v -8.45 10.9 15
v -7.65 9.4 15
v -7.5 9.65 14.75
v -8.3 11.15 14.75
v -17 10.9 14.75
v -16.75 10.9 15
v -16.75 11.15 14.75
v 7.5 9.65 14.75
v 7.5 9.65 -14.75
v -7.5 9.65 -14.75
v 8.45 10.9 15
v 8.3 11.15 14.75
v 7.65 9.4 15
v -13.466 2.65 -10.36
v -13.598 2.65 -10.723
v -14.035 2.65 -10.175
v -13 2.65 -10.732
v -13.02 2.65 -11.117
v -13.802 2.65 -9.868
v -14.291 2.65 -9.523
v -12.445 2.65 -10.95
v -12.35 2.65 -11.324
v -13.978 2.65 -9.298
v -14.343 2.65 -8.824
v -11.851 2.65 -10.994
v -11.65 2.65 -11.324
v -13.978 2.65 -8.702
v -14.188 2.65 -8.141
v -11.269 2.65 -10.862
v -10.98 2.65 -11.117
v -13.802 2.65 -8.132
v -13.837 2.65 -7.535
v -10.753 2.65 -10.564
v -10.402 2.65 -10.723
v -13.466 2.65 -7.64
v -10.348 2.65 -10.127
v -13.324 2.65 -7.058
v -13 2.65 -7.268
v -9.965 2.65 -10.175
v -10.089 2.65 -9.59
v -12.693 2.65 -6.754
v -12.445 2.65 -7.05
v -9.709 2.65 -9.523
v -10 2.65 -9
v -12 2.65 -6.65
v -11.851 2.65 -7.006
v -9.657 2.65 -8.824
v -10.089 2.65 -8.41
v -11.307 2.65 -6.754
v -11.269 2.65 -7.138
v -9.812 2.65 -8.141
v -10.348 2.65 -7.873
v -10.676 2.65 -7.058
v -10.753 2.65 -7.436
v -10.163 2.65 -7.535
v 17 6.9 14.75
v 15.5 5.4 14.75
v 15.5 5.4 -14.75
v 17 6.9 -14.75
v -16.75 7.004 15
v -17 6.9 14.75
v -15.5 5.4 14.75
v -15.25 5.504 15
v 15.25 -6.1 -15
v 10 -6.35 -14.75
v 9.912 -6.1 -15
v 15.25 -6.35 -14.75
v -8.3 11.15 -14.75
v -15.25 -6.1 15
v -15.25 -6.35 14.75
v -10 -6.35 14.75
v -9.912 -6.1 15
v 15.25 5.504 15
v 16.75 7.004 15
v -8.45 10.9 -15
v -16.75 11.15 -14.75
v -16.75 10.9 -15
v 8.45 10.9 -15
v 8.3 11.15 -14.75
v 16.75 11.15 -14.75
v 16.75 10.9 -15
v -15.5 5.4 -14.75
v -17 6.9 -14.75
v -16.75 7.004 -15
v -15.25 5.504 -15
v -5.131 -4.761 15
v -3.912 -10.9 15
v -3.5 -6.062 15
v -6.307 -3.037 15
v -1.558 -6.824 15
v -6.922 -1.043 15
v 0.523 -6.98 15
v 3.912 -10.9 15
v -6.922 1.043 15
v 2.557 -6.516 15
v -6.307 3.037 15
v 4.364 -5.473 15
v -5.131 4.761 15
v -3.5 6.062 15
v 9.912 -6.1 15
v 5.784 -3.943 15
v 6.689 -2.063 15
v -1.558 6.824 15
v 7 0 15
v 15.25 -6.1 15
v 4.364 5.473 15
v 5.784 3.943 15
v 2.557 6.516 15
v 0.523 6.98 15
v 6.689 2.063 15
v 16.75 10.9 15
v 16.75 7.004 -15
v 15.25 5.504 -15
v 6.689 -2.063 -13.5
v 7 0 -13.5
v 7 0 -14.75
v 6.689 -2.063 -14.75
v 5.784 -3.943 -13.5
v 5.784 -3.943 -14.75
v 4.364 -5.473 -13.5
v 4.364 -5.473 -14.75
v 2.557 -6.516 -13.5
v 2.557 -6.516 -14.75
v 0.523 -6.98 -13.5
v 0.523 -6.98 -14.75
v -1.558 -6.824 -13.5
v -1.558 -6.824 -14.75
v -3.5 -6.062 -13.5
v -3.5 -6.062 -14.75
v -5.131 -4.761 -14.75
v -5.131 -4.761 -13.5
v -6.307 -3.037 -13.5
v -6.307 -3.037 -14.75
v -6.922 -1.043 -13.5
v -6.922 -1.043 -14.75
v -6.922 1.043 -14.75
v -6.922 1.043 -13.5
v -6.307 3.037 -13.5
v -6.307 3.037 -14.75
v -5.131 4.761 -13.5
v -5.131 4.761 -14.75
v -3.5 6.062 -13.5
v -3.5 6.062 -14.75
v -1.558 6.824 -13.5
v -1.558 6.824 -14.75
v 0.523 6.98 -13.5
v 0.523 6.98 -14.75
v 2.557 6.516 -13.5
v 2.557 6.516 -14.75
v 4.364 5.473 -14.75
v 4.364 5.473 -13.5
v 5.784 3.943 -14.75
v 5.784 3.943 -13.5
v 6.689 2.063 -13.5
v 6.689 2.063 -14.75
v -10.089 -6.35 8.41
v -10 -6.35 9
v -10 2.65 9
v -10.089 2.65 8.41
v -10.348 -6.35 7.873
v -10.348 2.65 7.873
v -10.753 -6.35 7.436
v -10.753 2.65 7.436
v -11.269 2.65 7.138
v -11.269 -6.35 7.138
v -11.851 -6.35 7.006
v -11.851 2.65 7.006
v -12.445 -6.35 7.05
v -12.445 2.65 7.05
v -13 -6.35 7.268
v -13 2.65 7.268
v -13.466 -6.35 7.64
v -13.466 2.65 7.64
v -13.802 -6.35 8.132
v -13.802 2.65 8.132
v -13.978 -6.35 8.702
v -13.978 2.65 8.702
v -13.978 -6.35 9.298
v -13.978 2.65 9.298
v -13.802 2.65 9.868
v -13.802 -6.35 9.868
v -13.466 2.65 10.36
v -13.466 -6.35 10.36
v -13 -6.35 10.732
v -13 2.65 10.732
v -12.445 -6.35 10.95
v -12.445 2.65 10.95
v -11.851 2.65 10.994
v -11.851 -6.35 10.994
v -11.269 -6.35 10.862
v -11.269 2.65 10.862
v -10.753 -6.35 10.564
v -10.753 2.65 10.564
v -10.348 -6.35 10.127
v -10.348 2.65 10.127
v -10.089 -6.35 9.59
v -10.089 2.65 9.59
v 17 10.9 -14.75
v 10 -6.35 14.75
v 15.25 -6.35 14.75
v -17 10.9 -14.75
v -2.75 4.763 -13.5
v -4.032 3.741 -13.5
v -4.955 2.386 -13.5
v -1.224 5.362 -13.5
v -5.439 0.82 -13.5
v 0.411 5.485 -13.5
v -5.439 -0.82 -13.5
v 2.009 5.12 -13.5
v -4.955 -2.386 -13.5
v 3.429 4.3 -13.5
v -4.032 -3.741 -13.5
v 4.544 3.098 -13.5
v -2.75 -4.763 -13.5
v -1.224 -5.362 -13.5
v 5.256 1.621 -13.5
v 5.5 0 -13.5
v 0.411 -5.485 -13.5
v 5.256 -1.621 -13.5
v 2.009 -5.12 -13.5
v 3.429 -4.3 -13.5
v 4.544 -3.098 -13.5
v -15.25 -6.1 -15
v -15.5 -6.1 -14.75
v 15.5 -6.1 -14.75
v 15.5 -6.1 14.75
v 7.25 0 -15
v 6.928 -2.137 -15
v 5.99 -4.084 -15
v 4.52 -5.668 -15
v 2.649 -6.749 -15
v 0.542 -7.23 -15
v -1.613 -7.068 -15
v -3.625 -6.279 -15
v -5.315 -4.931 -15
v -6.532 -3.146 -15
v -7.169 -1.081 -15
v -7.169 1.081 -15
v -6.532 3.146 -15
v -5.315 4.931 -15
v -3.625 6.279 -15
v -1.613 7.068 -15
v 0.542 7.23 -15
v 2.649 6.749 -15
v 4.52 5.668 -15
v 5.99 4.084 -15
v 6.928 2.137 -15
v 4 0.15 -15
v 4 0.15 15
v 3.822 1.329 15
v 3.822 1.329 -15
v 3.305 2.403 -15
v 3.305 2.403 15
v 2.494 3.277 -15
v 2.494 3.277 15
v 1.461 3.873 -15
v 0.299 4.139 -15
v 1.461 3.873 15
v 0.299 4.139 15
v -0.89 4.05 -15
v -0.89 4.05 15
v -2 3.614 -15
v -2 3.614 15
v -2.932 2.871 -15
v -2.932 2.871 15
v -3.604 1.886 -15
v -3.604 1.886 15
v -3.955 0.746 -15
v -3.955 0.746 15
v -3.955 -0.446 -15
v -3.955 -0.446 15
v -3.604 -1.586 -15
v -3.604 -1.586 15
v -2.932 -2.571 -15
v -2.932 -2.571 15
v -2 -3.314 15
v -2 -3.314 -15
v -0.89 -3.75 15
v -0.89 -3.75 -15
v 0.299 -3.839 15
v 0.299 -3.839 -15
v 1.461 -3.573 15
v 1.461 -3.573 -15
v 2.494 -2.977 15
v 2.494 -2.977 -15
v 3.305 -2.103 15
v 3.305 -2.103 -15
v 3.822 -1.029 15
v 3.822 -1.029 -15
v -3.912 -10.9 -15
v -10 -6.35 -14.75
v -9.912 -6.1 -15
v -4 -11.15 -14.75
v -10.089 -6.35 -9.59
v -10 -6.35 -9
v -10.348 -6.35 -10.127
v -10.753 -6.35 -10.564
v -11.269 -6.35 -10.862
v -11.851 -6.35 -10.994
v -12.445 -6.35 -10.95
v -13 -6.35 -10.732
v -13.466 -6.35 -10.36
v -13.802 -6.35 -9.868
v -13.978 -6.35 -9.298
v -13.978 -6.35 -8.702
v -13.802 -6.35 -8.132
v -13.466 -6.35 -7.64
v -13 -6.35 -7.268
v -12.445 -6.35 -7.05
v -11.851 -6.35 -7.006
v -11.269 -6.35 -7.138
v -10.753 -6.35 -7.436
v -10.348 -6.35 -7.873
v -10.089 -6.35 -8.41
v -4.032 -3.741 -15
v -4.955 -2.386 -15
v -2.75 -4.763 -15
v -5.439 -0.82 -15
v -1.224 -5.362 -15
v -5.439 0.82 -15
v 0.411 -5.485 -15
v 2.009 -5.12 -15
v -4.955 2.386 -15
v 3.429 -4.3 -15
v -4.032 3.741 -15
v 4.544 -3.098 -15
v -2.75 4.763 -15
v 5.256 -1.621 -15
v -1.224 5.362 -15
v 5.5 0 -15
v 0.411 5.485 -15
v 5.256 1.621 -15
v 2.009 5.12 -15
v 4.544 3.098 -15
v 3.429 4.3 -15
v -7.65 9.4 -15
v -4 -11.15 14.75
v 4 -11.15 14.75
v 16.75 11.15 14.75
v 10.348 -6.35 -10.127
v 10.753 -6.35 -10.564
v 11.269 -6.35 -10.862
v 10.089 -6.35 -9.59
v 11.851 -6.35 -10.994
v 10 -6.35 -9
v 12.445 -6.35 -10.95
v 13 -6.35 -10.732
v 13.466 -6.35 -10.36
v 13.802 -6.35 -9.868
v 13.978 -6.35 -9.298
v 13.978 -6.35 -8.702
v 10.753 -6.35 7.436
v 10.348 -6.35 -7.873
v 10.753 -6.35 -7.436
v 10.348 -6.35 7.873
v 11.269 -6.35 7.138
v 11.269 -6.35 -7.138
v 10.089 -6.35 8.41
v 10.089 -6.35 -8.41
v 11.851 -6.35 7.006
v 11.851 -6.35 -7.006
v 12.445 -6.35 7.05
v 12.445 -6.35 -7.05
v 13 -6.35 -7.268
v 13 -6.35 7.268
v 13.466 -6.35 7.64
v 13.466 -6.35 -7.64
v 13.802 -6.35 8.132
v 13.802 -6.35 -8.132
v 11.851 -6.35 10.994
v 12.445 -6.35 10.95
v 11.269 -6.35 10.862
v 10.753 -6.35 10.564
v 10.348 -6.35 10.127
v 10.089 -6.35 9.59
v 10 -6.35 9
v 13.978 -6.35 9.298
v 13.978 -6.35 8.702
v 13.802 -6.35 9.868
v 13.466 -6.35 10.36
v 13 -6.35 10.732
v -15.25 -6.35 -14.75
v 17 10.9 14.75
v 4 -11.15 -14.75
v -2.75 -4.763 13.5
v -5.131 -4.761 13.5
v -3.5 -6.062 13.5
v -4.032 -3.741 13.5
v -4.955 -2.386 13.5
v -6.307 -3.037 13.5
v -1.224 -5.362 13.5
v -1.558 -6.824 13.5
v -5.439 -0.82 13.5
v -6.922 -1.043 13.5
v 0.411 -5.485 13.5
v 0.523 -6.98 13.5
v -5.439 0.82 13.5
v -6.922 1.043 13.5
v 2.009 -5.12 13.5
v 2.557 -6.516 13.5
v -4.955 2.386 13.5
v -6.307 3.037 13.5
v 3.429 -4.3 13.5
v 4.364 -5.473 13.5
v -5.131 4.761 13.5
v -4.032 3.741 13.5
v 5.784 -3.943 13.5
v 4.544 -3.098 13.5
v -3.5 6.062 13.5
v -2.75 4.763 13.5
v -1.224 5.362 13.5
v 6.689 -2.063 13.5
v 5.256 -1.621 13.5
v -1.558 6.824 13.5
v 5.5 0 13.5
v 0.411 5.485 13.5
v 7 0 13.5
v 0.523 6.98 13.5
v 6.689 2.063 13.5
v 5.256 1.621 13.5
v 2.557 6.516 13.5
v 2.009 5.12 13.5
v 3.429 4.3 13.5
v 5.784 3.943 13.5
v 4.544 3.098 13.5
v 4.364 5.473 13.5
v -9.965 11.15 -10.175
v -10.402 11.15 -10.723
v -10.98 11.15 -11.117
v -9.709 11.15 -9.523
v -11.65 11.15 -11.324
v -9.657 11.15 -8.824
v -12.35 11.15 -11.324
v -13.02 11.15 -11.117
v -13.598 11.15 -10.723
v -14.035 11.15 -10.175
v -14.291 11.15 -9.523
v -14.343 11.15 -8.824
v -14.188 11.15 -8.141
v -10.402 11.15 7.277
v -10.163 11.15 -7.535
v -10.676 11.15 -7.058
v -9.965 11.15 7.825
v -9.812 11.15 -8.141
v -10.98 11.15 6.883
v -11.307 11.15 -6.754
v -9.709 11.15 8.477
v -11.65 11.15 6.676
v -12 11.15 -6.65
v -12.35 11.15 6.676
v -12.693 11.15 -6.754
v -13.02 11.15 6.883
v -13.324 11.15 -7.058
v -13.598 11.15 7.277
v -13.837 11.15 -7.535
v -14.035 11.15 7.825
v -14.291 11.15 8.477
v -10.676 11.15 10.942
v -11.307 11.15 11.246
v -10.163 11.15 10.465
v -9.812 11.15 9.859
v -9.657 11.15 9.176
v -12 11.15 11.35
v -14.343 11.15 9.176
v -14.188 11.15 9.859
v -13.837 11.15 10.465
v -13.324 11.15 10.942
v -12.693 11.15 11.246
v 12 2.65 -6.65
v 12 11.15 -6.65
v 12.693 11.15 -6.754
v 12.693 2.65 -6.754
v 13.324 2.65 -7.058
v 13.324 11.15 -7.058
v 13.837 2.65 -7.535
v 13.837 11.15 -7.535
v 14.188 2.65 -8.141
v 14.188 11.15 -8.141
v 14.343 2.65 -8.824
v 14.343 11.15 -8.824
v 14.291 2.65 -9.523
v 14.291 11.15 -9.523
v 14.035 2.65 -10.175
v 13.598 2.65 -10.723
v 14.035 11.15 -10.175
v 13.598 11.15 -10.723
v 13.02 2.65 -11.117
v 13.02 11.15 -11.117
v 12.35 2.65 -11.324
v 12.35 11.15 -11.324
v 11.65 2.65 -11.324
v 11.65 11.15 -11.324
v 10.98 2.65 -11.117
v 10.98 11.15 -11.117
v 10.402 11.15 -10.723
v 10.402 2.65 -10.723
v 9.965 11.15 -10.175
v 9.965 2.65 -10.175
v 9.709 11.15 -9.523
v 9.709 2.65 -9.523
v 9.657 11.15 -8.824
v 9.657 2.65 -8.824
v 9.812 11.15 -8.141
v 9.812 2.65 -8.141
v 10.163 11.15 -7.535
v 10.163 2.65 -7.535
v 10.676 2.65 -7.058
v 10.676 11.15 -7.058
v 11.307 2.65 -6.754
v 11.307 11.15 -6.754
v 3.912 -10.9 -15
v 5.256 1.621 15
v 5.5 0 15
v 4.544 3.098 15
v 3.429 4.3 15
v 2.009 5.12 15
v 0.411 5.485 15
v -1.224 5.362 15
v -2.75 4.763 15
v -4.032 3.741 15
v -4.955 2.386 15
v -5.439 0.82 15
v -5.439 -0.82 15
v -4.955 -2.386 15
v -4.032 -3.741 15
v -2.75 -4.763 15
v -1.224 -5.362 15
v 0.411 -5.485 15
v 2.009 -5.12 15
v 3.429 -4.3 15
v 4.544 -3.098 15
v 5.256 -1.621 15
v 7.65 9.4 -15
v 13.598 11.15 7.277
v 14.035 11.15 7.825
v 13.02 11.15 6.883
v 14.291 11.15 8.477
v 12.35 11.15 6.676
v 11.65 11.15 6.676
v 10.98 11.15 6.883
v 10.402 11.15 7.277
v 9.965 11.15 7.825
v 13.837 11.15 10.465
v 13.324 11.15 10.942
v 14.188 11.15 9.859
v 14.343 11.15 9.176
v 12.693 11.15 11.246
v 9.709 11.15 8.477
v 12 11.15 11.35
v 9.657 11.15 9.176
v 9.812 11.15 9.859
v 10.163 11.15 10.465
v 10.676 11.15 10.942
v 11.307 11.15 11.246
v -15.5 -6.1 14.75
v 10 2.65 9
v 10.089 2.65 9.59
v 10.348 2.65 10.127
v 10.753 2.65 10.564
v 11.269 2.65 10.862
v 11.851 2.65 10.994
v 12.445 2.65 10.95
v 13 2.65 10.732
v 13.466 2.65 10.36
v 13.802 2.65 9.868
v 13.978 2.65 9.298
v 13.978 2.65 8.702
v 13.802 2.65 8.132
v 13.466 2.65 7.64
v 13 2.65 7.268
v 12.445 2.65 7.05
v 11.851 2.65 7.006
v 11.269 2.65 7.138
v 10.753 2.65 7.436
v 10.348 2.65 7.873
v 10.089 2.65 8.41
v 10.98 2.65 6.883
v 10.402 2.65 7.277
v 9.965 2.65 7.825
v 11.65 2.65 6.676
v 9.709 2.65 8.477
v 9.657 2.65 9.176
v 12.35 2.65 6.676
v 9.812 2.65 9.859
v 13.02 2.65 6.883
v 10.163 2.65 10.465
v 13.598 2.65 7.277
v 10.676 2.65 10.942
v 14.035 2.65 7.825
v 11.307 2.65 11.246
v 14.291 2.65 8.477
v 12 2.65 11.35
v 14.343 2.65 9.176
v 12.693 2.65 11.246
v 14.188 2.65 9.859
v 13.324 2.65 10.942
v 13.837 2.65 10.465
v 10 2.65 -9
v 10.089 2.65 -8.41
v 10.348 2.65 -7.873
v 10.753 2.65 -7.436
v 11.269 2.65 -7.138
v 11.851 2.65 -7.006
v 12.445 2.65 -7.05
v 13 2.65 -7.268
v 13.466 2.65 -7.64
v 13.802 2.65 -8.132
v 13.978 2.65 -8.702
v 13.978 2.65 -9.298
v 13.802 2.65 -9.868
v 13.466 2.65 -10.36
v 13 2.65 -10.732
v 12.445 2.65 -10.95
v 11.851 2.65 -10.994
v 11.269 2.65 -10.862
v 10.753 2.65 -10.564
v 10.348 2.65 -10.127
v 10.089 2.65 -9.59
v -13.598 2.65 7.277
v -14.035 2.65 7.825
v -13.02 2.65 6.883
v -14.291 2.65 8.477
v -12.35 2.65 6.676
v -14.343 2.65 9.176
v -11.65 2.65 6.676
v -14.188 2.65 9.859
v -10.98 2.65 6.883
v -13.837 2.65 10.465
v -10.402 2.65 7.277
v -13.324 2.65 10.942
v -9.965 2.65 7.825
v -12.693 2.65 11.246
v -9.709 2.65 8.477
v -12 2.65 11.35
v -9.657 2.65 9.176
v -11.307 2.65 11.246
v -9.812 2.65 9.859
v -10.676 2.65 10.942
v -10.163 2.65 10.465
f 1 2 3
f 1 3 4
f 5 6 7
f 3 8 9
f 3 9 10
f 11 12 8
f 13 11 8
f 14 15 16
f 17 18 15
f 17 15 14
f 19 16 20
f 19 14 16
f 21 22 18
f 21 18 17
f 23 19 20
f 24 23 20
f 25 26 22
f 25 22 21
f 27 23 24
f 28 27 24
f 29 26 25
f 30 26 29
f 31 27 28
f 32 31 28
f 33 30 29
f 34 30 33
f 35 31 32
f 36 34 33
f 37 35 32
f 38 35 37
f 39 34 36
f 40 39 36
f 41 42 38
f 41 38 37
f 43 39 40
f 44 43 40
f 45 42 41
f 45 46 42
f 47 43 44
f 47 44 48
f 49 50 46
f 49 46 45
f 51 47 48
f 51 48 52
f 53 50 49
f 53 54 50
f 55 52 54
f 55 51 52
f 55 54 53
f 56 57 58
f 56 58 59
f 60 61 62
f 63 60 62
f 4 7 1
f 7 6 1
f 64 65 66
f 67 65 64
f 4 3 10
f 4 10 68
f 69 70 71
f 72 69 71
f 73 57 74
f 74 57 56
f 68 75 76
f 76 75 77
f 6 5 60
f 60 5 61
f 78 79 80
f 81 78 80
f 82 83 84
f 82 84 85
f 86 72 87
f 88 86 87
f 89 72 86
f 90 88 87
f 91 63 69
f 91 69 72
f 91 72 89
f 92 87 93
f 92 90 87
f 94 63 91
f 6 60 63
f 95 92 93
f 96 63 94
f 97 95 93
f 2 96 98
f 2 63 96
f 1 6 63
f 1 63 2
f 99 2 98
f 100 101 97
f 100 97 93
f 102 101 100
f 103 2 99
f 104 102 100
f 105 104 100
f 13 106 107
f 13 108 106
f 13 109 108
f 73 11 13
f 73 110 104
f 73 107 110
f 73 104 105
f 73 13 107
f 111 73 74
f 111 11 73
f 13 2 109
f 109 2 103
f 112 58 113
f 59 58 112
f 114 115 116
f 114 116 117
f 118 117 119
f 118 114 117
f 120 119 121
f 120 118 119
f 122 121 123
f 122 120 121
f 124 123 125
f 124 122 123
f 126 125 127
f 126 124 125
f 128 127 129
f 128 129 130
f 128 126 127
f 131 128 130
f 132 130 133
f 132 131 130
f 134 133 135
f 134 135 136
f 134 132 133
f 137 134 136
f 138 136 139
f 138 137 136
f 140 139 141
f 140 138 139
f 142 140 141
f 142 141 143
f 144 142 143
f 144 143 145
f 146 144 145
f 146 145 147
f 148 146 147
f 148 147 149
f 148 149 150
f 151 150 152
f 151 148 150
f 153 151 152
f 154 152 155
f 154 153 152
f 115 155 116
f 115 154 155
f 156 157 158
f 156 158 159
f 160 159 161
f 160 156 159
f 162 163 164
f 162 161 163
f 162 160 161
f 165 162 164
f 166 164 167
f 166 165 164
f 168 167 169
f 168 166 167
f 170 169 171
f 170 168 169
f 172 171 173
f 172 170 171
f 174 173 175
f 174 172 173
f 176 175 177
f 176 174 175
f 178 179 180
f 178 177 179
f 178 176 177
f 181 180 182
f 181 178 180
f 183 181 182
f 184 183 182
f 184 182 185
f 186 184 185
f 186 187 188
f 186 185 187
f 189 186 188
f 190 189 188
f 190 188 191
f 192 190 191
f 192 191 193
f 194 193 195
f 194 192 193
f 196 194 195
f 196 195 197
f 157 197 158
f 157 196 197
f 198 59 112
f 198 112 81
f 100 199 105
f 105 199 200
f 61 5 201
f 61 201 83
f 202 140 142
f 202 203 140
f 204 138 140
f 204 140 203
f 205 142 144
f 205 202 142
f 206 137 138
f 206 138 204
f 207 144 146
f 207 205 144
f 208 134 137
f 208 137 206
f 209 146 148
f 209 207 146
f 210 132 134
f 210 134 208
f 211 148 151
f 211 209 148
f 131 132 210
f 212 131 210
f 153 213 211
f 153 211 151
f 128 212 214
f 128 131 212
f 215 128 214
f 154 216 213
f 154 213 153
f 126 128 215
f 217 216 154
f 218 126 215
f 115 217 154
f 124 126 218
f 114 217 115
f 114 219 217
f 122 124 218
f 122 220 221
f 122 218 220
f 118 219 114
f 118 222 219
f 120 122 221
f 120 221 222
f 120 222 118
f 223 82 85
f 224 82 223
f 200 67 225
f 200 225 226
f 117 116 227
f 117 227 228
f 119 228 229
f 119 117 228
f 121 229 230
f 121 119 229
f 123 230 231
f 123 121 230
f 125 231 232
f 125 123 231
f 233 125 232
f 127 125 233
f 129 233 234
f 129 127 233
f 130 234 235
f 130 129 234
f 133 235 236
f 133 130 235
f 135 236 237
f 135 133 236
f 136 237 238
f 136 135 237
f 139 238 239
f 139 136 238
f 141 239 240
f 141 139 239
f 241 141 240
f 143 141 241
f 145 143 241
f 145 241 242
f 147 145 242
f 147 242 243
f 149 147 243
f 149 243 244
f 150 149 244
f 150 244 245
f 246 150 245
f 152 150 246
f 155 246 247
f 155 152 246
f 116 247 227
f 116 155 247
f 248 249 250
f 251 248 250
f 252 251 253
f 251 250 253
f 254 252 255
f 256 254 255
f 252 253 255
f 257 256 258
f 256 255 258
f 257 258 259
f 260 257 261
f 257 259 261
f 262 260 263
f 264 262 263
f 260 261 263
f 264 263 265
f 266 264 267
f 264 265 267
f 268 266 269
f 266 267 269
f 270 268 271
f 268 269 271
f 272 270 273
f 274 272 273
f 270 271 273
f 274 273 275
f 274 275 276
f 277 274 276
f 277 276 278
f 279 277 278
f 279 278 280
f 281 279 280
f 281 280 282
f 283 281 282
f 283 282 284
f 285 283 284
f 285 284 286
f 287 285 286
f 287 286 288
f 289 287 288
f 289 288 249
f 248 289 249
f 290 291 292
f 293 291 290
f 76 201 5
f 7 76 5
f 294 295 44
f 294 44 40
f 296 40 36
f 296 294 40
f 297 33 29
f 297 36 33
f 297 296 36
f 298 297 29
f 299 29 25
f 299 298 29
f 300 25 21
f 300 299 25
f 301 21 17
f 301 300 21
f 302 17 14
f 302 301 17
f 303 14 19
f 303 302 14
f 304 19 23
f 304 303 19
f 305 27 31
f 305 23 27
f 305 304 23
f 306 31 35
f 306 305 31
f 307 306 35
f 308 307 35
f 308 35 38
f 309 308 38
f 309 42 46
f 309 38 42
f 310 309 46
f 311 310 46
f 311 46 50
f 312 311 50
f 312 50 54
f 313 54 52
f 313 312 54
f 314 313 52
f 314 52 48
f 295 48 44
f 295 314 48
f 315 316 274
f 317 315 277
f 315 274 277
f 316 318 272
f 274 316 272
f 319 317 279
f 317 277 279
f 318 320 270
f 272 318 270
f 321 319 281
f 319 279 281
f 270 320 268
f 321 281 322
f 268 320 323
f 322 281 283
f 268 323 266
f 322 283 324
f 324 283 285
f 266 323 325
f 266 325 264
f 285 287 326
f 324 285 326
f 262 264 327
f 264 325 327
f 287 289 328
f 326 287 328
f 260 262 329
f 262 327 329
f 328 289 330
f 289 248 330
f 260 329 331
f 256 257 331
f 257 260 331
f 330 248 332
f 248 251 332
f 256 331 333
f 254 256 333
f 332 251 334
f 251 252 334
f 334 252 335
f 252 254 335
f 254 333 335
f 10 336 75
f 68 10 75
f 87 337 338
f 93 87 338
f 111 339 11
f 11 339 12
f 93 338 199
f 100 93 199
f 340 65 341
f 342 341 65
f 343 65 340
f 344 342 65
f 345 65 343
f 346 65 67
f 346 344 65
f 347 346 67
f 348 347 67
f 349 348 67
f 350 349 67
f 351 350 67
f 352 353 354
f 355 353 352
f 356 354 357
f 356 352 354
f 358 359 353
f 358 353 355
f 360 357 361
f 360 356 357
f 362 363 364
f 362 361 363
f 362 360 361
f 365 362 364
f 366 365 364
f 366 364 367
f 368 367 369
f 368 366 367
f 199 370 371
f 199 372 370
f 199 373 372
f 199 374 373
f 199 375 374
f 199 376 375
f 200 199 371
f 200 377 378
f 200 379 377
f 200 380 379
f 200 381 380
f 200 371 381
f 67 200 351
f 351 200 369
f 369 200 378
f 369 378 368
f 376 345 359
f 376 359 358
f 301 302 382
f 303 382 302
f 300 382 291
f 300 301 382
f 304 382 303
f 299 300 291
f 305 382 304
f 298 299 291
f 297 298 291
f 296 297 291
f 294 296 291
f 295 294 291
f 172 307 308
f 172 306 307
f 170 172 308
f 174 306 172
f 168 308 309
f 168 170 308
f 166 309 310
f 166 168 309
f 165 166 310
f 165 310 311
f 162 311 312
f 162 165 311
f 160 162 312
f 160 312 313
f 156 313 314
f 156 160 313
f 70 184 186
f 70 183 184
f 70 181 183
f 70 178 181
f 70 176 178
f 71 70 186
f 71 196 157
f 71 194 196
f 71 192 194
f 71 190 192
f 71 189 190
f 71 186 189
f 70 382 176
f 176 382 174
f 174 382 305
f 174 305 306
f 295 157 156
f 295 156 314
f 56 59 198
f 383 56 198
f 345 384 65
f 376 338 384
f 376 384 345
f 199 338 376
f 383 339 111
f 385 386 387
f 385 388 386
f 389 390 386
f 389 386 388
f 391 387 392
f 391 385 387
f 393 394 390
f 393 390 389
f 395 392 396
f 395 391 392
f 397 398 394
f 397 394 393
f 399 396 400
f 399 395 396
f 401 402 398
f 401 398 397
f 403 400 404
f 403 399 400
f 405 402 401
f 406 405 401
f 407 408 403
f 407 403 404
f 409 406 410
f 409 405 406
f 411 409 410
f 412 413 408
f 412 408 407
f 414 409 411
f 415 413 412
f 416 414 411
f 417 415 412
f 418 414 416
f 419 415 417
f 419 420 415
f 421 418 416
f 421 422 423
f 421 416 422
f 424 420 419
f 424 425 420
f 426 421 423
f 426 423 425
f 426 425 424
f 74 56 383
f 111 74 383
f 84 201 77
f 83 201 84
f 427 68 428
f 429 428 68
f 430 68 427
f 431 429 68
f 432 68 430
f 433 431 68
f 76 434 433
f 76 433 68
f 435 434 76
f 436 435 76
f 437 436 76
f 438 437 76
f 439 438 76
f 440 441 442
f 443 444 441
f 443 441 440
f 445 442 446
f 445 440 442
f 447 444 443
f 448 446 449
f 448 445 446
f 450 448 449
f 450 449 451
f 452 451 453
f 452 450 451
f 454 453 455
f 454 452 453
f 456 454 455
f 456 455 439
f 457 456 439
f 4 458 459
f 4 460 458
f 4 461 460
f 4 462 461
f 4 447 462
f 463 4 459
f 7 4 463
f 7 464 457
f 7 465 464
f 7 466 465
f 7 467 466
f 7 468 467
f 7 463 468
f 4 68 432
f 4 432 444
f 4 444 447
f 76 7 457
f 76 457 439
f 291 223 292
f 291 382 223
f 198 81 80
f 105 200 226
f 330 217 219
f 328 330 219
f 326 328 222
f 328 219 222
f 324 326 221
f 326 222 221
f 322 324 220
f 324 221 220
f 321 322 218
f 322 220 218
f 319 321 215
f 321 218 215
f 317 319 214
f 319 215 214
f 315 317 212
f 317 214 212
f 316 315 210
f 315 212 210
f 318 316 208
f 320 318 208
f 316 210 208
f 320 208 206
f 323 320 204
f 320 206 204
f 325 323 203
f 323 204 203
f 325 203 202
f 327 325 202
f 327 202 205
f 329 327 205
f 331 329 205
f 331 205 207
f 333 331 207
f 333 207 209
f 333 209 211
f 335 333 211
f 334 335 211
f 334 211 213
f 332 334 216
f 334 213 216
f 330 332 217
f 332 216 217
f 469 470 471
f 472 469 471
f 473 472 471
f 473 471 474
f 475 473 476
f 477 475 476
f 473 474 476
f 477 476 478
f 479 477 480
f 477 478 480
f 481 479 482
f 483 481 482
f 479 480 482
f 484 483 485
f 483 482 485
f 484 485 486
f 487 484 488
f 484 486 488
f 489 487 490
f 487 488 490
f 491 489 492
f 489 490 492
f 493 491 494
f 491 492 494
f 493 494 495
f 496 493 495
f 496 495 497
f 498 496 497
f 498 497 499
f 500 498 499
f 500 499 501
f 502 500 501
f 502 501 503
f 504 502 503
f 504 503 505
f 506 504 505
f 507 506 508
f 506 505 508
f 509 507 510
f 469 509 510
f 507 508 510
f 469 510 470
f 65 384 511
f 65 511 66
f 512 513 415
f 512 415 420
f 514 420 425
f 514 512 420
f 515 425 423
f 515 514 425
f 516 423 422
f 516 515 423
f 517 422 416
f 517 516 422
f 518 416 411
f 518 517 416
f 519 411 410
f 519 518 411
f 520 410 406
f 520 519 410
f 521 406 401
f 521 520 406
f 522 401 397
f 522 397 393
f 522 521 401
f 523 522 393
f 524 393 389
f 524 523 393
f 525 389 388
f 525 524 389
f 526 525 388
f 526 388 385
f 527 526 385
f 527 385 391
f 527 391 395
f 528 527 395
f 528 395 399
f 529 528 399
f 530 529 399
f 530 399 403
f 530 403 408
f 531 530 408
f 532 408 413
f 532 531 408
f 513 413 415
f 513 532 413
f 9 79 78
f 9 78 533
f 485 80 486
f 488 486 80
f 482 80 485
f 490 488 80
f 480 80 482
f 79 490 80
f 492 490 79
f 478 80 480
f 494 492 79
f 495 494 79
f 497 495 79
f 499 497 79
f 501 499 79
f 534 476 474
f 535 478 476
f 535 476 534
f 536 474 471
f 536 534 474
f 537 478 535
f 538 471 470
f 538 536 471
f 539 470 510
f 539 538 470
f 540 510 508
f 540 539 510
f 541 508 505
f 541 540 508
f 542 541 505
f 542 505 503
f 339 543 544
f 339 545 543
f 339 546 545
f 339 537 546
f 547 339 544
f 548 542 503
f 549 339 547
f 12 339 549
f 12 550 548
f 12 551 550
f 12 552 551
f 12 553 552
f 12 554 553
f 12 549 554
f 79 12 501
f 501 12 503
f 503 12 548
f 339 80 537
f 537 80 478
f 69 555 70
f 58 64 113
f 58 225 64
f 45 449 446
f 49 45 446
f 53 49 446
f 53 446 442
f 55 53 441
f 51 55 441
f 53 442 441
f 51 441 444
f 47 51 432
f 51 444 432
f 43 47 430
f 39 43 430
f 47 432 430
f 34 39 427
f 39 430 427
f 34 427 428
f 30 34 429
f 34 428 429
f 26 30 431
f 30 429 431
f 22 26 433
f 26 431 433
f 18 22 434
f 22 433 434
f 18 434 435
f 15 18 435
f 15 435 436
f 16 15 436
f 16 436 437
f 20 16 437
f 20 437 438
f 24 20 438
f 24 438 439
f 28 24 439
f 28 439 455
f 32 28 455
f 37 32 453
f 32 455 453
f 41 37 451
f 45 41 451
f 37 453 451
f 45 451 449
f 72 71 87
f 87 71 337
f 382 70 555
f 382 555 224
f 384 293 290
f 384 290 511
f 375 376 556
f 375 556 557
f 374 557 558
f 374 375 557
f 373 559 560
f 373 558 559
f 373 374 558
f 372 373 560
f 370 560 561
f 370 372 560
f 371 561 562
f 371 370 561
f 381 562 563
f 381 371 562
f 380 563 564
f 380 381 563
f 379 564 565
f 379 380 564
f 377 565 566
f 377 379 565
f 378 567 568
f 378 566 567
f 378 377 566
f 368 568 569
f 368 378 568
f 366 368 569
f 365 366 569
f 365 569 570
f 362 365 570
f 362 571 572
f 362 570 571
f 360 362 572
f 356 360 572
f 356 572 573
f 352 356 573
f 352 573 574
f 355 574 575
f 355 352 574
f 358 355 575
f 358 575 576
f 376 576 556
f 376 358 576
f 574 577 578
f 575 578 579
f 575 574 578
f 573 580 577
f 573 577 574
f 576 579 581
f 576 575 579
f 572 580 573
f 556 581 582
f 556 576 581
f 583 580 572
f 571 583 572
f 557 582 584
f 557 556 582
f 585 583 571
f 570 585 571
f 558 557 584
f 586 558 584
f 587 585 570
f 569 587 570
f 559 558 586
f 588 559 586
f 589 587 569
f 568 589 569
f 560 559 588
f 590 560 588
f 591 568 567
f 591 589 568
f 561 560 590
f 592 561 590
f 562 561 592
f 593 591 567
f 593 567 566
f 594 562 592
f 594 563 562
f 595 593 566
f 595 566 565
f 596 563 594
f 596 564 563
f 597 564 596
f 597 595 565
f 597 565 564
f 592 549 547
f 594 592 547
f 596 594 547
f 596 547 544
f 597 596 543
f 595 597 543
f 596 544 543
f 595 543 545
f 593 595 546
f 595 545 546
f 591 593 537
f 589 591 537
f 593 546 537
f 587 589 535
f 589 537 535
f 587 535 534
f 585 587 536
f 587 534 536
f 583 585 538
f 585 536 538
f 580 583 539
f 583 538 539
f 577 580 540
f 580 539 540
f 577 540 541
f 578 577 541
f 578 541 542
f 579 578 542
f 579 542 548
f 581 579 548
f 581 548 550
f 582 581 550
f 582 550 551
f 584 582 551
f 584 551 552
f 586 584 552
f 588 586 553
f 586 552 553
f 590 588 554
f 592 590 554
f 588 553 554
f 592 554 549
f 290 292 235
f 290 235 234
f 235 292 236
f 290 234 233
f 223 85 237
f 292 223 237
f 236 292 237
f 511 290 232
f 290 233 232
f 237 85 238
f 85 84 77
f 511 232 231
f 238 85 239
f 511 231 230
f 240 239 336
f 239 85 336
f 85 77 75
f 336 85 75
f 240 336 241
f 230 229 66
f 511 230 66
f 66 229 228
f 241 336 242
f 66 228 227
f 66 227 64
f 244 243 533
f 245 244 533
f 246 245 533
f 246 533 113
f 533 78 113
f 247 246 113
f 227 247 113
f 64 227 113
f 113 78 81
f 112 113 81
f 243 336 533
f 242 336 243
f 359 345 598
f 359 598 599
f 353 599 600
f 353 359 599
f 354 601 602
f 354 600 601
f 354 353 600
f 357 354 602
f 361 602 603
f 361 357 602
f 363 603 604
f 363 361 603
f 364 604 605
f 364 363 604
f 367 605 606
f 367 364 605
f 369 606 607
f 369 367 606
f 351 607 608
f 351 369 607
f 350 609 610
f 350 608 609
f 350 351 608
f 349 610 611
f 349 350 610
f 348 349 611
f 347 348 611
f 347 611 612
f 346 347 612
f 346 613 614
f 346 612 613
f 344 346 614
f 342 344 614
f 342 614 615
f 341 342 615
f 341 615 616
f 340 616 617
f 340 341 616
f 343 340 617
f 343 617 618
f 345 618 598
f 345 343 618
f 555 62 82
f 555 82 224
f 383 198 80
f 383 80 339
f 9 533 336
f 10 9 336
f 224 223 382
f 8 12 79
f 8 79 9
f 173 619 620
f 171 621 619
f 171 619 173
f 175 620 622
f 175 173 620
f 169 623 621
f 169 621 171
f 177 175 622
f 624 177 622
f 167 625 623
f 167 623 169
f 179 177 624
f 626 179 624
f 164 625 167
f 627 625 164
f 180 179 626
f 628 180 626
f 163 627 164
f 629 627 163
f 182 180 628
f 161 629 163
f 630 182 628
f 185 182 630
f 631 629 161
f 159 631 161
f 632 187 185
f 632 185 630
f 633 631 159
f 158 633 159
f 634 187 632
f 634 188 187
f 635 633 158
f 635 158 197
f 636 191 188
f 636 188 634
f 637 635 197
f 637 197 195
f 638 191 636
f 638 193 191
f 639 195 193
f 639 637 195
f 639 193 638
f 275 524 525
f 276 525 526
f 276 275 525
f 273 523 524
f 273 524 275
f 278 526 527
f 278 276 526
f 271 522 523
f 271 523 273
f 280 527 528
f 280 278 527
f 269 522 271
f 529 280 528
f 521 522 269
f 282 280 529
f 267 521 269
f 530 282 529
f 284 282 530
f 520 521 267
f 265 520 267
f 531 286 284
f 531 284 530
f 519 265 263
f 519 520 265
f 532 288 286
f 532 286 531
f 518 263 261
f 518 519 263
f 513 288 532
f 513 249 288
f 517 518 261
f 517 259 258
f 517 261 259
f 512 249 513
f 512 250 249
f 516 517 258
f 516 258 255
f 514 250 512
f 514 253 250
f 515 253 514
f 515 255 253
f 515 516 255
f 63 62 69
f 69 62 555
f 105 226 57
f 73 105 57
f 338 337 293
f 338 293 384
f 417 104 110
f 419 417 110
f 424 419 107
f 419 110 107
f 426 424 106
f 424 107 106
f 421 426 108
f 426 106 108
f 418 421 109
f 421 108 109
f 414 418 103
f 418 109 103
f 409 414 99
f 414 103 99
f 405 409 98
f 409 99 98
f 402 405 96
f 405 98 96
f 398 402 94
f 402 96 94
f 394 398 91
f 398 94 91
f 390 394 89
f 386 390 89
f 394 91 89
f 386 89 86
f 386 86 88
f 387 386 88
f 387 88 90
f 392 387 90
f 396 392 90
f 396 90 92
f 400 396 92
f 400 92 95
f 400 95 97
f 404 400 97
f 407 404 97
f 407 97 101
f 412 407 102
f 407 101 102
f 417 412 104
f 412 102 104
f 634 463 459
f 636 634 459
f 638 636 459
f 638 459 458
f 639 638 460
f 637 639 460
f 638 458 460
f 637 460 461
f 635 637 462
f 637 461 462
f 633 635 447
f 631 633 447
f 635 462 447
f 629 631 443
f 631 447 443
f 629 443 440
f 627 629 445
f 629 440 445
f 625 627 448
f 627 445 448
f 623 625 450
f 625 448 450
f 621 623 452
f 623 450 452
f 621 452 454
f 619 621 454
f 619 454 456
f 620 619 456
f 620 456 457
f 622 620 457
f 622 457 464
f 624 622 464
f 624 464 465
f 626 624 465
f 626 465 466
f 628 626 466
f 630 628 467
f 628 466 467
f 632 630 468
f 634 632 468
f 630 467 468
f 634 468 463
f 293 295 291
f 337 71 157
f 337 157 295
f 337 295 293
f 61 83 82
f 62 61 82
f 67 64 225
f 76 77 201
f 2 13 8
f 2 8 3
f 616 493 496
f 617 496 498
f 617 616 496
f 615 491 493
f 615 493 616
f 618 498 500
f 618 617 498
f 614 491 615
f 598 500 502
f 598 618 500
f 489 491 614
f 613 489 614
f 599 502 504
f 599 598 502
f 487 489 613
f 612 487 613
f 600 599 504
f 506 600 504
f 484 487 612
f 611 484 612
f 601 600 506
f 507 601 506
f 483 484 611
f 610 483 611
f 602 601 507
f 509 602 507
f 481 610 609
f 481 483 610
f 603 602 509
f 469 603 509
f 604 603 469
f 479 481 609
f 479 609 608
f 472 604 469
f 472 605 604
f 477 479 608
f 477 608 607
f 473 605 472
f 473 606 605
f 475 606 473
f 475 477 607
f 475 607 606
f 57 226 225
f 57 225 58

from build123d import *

# Parameters (mm, degrees)
SALIENTE_EXTRUIR1_DEPTH    = 15
CROQUIS2_R                 = 4
CORTAR_EXTRUIR1_DEPTH      = 37.239791666
CORTAR_EXTRUIR2_DEPTH      = 32.800786154
CORTAR_EXTRUIR2_DEPTH_BACK = 32.800786154
CROQUIS3_R                 = 2
SALIENTE_EXTRUIR2_DEPTH    = 30
CROQUIS5_R                 = 7
CROQUIS5_R_2               = 5.5
CORTAR_EXTRUIR3_DEPTH      = 1.5
CORTAR_EXTRUIR4_START      = -1.5
CROQUIS6_R                 = 7
CROQUIS6_R_2               = 5.5
CORTAR_EXTRUIR4_DEPTH      = 1.5
CROQUIS7_R                 = 2.35
CORTAR_EXTRUIR5_DEPTH      = 8.5
CHAFL_N1_SIZE              = 0.25


with BuildPart() as part:
    # Croquis1 → Saliente-Extruir1 (new, symmetric)
    with BuildSketch(Plane.XY):
        Polygon((-4, -11.15), (4, -11.15), (10, -6.35), (15.5, -6.35), (15.5, 5.4), (17, 6.9), (17, 11.15), (10, 11.15), (7.5, 9.65), (-7.5, 9.65), (-10, 11.15), (-17, 11.15), (-17, 6.9), (-15.5, 5.4), (-15.5, -6.35), (-10, -6.35), align=None)
    extrude(amount=SALIENTE_EXTRUIR1_DEPTH, both=True)

    # Croquis2 → Cortar-Extruir1 (cut, through all)
    with BuildSketch(Plane.XY.offset(15)):
        with Locations((0, 0.15)):
            Circle(CROQUIS2_R)
    extrude(amount=-CORTAR_EXTRUIR1_DEPTH, mode=Mode.SUBTRACT)

    # Croquis3 → Cortar-Extruir2 (cut, two sides: drawn at the far end of the back side and taken through both)
    with BuildSketch(Plane(origin=(0, 11.15, 0), x_dir=(1, 0, 0), z_dir=(0, 1, 0)).offset(-CORTAR_EXTRUIR2_DEPTH_BACK)):
        with Locations((-12, 9)):
            Circle(CROQUIS3_R)
        with Locations(Location((12, 9, 0), (0, 0, 180))):
            Circle(CROQUIS3_R)
        with Locations((-12, -9)):
            Circle(CROQUIS3_R)
        with Locations(Location((12, -9, 0), (0, 0, 180))):
            Circle(CROQUIS3_R)
    extrude(amount=CORTAR_EXTRUIR2_DEPTH + CORTAR_EXTRUIR2_DEPTH_BACK, mode=Mode.SUBTRACT)

    # Croquis4 → Saliente-Extruir2 (add, through all)
    with BuildSketch(Plane.XY.offset(15)):
        Polygon((-10, 11.15), (-7.5, 9.65), (-8.3, 11.15), align=None)
        Polygon((7.5, 9.65), (10, 11.15), (8.3, 11.15), align=None)
    extrude(amount=-SALIENTE_EXTRUIR2_DEPTH)

    # Croquis5 → Cortar-Extruir3 (cut)
    with BuildSketch(Plane.XY.offset(15)):
        Circle(CROQUIS5_R)
        Circle(CROQUIS5_R_2, mode=Mode.SUBTRACT)
    extrude(amount=-CORTAR_EXTRUIR3_DEPTH, mode=Mode.SUBTRACT)

    # Croquis6 → Cortar-Extruir4 (cut)
    with BuildSketch(Plane(origin=(0, 0, -15), x_dir=(-1, 0, 0), z_dir=(0, 0, -1)).offset(CORTAR_EXTRUIR4_START)):
        with Locations(Location((0, 0, 0), (0, 0, 180))):
            Circle(CROQUIS6_R)
        with Locations(Location((0, 0, 0), (0, 0, 180))):
            Circle(CROQUIS6_R_2, mode=Mode.SUBTRACT)
    extrude(amount=CORTAR_EXTRUIR4_DEPTH, mode=Mode.SUBTRACT)

    # Croquis7 → Cortar-Extruir5 (cut)
    with BuildSketch(Plane(origin=(0, 11.15, 0), x_dir=(1, 0, 0), z_dir=(0, 1, 0))):
        with Locations(Location((-12, 9, 0), (0, 0, 270))):
            Circle(CROQUIS7_R)
        with Locations(Location((-12, -9, 0), (0, 0, 270))):
            Circle(CROQUIS7_R)
        with Locations(Location((12, -9, 0), (0, 0, 270))):
            Circle(CROQUIS7_R)
        with Locations(Location((12, 9, 0), (0, 0, 270))):
            Circle(CROQUIS7_R)
    extrude(amount=-CORTAR_EXTRUIR5_DEPTH, mode=Mode.SUBTRACT)

    # Chaflán1
    chafl_n1_edges = [part.edges().sort_by_distance(p)[0] for p in [
        (0, 9.65, 15),
        (-7, 0, -15),
        (17, 9.025, -15),
        (16.25, 6.15, -15),
        (15.5, -0.475, -15),
        (12.75, -6.35, -15),
        (7, -8.75, -15),
        (-12.65, 11.15, 15),
        (0, -11.15, -15),
        (-7, -8.75, -15),
        (-12.75, -6.35, -15),
        (-15.5, -0.475, -15),
        (-16.25, 6.15, -15),
        (-17, 9.025, -15),
        (-12.65, 11.15, -15),
        (-17, 9.025, 15),
        (0, 9.65, -15),
        (12.65, 11.15, -15),
        (-16.25, 6.15, 15),
        (-15.5, -0.475, 15),
        (17, 11.15, 0),
        (15.5, -6.35, 0),
        (-15.5, -6.35, 0),
        (-17, 11.15, 0),
        (-12.75, -6.35, 15),
        (-7, -8.75, 15),
        (0, -11.15, 15),
        (7, -8.75, 15),
        (12.65, 11.15, 15),
        (12.75, -6.35, 15),
        (15.5, -0.475, 15),
        (16.25, 6.15, 15),
        (17, 9.025, 15),
        (-7.9, 10.4, -15),
        (-7.9, 10.4, 15),
        (7.9, 10.4, -15),
        (7.9, 10.4, 15),
    ]]
    chamfer(chafl_n1_edges, length=CHAFL_N1_SIZE)


solid = part.part
